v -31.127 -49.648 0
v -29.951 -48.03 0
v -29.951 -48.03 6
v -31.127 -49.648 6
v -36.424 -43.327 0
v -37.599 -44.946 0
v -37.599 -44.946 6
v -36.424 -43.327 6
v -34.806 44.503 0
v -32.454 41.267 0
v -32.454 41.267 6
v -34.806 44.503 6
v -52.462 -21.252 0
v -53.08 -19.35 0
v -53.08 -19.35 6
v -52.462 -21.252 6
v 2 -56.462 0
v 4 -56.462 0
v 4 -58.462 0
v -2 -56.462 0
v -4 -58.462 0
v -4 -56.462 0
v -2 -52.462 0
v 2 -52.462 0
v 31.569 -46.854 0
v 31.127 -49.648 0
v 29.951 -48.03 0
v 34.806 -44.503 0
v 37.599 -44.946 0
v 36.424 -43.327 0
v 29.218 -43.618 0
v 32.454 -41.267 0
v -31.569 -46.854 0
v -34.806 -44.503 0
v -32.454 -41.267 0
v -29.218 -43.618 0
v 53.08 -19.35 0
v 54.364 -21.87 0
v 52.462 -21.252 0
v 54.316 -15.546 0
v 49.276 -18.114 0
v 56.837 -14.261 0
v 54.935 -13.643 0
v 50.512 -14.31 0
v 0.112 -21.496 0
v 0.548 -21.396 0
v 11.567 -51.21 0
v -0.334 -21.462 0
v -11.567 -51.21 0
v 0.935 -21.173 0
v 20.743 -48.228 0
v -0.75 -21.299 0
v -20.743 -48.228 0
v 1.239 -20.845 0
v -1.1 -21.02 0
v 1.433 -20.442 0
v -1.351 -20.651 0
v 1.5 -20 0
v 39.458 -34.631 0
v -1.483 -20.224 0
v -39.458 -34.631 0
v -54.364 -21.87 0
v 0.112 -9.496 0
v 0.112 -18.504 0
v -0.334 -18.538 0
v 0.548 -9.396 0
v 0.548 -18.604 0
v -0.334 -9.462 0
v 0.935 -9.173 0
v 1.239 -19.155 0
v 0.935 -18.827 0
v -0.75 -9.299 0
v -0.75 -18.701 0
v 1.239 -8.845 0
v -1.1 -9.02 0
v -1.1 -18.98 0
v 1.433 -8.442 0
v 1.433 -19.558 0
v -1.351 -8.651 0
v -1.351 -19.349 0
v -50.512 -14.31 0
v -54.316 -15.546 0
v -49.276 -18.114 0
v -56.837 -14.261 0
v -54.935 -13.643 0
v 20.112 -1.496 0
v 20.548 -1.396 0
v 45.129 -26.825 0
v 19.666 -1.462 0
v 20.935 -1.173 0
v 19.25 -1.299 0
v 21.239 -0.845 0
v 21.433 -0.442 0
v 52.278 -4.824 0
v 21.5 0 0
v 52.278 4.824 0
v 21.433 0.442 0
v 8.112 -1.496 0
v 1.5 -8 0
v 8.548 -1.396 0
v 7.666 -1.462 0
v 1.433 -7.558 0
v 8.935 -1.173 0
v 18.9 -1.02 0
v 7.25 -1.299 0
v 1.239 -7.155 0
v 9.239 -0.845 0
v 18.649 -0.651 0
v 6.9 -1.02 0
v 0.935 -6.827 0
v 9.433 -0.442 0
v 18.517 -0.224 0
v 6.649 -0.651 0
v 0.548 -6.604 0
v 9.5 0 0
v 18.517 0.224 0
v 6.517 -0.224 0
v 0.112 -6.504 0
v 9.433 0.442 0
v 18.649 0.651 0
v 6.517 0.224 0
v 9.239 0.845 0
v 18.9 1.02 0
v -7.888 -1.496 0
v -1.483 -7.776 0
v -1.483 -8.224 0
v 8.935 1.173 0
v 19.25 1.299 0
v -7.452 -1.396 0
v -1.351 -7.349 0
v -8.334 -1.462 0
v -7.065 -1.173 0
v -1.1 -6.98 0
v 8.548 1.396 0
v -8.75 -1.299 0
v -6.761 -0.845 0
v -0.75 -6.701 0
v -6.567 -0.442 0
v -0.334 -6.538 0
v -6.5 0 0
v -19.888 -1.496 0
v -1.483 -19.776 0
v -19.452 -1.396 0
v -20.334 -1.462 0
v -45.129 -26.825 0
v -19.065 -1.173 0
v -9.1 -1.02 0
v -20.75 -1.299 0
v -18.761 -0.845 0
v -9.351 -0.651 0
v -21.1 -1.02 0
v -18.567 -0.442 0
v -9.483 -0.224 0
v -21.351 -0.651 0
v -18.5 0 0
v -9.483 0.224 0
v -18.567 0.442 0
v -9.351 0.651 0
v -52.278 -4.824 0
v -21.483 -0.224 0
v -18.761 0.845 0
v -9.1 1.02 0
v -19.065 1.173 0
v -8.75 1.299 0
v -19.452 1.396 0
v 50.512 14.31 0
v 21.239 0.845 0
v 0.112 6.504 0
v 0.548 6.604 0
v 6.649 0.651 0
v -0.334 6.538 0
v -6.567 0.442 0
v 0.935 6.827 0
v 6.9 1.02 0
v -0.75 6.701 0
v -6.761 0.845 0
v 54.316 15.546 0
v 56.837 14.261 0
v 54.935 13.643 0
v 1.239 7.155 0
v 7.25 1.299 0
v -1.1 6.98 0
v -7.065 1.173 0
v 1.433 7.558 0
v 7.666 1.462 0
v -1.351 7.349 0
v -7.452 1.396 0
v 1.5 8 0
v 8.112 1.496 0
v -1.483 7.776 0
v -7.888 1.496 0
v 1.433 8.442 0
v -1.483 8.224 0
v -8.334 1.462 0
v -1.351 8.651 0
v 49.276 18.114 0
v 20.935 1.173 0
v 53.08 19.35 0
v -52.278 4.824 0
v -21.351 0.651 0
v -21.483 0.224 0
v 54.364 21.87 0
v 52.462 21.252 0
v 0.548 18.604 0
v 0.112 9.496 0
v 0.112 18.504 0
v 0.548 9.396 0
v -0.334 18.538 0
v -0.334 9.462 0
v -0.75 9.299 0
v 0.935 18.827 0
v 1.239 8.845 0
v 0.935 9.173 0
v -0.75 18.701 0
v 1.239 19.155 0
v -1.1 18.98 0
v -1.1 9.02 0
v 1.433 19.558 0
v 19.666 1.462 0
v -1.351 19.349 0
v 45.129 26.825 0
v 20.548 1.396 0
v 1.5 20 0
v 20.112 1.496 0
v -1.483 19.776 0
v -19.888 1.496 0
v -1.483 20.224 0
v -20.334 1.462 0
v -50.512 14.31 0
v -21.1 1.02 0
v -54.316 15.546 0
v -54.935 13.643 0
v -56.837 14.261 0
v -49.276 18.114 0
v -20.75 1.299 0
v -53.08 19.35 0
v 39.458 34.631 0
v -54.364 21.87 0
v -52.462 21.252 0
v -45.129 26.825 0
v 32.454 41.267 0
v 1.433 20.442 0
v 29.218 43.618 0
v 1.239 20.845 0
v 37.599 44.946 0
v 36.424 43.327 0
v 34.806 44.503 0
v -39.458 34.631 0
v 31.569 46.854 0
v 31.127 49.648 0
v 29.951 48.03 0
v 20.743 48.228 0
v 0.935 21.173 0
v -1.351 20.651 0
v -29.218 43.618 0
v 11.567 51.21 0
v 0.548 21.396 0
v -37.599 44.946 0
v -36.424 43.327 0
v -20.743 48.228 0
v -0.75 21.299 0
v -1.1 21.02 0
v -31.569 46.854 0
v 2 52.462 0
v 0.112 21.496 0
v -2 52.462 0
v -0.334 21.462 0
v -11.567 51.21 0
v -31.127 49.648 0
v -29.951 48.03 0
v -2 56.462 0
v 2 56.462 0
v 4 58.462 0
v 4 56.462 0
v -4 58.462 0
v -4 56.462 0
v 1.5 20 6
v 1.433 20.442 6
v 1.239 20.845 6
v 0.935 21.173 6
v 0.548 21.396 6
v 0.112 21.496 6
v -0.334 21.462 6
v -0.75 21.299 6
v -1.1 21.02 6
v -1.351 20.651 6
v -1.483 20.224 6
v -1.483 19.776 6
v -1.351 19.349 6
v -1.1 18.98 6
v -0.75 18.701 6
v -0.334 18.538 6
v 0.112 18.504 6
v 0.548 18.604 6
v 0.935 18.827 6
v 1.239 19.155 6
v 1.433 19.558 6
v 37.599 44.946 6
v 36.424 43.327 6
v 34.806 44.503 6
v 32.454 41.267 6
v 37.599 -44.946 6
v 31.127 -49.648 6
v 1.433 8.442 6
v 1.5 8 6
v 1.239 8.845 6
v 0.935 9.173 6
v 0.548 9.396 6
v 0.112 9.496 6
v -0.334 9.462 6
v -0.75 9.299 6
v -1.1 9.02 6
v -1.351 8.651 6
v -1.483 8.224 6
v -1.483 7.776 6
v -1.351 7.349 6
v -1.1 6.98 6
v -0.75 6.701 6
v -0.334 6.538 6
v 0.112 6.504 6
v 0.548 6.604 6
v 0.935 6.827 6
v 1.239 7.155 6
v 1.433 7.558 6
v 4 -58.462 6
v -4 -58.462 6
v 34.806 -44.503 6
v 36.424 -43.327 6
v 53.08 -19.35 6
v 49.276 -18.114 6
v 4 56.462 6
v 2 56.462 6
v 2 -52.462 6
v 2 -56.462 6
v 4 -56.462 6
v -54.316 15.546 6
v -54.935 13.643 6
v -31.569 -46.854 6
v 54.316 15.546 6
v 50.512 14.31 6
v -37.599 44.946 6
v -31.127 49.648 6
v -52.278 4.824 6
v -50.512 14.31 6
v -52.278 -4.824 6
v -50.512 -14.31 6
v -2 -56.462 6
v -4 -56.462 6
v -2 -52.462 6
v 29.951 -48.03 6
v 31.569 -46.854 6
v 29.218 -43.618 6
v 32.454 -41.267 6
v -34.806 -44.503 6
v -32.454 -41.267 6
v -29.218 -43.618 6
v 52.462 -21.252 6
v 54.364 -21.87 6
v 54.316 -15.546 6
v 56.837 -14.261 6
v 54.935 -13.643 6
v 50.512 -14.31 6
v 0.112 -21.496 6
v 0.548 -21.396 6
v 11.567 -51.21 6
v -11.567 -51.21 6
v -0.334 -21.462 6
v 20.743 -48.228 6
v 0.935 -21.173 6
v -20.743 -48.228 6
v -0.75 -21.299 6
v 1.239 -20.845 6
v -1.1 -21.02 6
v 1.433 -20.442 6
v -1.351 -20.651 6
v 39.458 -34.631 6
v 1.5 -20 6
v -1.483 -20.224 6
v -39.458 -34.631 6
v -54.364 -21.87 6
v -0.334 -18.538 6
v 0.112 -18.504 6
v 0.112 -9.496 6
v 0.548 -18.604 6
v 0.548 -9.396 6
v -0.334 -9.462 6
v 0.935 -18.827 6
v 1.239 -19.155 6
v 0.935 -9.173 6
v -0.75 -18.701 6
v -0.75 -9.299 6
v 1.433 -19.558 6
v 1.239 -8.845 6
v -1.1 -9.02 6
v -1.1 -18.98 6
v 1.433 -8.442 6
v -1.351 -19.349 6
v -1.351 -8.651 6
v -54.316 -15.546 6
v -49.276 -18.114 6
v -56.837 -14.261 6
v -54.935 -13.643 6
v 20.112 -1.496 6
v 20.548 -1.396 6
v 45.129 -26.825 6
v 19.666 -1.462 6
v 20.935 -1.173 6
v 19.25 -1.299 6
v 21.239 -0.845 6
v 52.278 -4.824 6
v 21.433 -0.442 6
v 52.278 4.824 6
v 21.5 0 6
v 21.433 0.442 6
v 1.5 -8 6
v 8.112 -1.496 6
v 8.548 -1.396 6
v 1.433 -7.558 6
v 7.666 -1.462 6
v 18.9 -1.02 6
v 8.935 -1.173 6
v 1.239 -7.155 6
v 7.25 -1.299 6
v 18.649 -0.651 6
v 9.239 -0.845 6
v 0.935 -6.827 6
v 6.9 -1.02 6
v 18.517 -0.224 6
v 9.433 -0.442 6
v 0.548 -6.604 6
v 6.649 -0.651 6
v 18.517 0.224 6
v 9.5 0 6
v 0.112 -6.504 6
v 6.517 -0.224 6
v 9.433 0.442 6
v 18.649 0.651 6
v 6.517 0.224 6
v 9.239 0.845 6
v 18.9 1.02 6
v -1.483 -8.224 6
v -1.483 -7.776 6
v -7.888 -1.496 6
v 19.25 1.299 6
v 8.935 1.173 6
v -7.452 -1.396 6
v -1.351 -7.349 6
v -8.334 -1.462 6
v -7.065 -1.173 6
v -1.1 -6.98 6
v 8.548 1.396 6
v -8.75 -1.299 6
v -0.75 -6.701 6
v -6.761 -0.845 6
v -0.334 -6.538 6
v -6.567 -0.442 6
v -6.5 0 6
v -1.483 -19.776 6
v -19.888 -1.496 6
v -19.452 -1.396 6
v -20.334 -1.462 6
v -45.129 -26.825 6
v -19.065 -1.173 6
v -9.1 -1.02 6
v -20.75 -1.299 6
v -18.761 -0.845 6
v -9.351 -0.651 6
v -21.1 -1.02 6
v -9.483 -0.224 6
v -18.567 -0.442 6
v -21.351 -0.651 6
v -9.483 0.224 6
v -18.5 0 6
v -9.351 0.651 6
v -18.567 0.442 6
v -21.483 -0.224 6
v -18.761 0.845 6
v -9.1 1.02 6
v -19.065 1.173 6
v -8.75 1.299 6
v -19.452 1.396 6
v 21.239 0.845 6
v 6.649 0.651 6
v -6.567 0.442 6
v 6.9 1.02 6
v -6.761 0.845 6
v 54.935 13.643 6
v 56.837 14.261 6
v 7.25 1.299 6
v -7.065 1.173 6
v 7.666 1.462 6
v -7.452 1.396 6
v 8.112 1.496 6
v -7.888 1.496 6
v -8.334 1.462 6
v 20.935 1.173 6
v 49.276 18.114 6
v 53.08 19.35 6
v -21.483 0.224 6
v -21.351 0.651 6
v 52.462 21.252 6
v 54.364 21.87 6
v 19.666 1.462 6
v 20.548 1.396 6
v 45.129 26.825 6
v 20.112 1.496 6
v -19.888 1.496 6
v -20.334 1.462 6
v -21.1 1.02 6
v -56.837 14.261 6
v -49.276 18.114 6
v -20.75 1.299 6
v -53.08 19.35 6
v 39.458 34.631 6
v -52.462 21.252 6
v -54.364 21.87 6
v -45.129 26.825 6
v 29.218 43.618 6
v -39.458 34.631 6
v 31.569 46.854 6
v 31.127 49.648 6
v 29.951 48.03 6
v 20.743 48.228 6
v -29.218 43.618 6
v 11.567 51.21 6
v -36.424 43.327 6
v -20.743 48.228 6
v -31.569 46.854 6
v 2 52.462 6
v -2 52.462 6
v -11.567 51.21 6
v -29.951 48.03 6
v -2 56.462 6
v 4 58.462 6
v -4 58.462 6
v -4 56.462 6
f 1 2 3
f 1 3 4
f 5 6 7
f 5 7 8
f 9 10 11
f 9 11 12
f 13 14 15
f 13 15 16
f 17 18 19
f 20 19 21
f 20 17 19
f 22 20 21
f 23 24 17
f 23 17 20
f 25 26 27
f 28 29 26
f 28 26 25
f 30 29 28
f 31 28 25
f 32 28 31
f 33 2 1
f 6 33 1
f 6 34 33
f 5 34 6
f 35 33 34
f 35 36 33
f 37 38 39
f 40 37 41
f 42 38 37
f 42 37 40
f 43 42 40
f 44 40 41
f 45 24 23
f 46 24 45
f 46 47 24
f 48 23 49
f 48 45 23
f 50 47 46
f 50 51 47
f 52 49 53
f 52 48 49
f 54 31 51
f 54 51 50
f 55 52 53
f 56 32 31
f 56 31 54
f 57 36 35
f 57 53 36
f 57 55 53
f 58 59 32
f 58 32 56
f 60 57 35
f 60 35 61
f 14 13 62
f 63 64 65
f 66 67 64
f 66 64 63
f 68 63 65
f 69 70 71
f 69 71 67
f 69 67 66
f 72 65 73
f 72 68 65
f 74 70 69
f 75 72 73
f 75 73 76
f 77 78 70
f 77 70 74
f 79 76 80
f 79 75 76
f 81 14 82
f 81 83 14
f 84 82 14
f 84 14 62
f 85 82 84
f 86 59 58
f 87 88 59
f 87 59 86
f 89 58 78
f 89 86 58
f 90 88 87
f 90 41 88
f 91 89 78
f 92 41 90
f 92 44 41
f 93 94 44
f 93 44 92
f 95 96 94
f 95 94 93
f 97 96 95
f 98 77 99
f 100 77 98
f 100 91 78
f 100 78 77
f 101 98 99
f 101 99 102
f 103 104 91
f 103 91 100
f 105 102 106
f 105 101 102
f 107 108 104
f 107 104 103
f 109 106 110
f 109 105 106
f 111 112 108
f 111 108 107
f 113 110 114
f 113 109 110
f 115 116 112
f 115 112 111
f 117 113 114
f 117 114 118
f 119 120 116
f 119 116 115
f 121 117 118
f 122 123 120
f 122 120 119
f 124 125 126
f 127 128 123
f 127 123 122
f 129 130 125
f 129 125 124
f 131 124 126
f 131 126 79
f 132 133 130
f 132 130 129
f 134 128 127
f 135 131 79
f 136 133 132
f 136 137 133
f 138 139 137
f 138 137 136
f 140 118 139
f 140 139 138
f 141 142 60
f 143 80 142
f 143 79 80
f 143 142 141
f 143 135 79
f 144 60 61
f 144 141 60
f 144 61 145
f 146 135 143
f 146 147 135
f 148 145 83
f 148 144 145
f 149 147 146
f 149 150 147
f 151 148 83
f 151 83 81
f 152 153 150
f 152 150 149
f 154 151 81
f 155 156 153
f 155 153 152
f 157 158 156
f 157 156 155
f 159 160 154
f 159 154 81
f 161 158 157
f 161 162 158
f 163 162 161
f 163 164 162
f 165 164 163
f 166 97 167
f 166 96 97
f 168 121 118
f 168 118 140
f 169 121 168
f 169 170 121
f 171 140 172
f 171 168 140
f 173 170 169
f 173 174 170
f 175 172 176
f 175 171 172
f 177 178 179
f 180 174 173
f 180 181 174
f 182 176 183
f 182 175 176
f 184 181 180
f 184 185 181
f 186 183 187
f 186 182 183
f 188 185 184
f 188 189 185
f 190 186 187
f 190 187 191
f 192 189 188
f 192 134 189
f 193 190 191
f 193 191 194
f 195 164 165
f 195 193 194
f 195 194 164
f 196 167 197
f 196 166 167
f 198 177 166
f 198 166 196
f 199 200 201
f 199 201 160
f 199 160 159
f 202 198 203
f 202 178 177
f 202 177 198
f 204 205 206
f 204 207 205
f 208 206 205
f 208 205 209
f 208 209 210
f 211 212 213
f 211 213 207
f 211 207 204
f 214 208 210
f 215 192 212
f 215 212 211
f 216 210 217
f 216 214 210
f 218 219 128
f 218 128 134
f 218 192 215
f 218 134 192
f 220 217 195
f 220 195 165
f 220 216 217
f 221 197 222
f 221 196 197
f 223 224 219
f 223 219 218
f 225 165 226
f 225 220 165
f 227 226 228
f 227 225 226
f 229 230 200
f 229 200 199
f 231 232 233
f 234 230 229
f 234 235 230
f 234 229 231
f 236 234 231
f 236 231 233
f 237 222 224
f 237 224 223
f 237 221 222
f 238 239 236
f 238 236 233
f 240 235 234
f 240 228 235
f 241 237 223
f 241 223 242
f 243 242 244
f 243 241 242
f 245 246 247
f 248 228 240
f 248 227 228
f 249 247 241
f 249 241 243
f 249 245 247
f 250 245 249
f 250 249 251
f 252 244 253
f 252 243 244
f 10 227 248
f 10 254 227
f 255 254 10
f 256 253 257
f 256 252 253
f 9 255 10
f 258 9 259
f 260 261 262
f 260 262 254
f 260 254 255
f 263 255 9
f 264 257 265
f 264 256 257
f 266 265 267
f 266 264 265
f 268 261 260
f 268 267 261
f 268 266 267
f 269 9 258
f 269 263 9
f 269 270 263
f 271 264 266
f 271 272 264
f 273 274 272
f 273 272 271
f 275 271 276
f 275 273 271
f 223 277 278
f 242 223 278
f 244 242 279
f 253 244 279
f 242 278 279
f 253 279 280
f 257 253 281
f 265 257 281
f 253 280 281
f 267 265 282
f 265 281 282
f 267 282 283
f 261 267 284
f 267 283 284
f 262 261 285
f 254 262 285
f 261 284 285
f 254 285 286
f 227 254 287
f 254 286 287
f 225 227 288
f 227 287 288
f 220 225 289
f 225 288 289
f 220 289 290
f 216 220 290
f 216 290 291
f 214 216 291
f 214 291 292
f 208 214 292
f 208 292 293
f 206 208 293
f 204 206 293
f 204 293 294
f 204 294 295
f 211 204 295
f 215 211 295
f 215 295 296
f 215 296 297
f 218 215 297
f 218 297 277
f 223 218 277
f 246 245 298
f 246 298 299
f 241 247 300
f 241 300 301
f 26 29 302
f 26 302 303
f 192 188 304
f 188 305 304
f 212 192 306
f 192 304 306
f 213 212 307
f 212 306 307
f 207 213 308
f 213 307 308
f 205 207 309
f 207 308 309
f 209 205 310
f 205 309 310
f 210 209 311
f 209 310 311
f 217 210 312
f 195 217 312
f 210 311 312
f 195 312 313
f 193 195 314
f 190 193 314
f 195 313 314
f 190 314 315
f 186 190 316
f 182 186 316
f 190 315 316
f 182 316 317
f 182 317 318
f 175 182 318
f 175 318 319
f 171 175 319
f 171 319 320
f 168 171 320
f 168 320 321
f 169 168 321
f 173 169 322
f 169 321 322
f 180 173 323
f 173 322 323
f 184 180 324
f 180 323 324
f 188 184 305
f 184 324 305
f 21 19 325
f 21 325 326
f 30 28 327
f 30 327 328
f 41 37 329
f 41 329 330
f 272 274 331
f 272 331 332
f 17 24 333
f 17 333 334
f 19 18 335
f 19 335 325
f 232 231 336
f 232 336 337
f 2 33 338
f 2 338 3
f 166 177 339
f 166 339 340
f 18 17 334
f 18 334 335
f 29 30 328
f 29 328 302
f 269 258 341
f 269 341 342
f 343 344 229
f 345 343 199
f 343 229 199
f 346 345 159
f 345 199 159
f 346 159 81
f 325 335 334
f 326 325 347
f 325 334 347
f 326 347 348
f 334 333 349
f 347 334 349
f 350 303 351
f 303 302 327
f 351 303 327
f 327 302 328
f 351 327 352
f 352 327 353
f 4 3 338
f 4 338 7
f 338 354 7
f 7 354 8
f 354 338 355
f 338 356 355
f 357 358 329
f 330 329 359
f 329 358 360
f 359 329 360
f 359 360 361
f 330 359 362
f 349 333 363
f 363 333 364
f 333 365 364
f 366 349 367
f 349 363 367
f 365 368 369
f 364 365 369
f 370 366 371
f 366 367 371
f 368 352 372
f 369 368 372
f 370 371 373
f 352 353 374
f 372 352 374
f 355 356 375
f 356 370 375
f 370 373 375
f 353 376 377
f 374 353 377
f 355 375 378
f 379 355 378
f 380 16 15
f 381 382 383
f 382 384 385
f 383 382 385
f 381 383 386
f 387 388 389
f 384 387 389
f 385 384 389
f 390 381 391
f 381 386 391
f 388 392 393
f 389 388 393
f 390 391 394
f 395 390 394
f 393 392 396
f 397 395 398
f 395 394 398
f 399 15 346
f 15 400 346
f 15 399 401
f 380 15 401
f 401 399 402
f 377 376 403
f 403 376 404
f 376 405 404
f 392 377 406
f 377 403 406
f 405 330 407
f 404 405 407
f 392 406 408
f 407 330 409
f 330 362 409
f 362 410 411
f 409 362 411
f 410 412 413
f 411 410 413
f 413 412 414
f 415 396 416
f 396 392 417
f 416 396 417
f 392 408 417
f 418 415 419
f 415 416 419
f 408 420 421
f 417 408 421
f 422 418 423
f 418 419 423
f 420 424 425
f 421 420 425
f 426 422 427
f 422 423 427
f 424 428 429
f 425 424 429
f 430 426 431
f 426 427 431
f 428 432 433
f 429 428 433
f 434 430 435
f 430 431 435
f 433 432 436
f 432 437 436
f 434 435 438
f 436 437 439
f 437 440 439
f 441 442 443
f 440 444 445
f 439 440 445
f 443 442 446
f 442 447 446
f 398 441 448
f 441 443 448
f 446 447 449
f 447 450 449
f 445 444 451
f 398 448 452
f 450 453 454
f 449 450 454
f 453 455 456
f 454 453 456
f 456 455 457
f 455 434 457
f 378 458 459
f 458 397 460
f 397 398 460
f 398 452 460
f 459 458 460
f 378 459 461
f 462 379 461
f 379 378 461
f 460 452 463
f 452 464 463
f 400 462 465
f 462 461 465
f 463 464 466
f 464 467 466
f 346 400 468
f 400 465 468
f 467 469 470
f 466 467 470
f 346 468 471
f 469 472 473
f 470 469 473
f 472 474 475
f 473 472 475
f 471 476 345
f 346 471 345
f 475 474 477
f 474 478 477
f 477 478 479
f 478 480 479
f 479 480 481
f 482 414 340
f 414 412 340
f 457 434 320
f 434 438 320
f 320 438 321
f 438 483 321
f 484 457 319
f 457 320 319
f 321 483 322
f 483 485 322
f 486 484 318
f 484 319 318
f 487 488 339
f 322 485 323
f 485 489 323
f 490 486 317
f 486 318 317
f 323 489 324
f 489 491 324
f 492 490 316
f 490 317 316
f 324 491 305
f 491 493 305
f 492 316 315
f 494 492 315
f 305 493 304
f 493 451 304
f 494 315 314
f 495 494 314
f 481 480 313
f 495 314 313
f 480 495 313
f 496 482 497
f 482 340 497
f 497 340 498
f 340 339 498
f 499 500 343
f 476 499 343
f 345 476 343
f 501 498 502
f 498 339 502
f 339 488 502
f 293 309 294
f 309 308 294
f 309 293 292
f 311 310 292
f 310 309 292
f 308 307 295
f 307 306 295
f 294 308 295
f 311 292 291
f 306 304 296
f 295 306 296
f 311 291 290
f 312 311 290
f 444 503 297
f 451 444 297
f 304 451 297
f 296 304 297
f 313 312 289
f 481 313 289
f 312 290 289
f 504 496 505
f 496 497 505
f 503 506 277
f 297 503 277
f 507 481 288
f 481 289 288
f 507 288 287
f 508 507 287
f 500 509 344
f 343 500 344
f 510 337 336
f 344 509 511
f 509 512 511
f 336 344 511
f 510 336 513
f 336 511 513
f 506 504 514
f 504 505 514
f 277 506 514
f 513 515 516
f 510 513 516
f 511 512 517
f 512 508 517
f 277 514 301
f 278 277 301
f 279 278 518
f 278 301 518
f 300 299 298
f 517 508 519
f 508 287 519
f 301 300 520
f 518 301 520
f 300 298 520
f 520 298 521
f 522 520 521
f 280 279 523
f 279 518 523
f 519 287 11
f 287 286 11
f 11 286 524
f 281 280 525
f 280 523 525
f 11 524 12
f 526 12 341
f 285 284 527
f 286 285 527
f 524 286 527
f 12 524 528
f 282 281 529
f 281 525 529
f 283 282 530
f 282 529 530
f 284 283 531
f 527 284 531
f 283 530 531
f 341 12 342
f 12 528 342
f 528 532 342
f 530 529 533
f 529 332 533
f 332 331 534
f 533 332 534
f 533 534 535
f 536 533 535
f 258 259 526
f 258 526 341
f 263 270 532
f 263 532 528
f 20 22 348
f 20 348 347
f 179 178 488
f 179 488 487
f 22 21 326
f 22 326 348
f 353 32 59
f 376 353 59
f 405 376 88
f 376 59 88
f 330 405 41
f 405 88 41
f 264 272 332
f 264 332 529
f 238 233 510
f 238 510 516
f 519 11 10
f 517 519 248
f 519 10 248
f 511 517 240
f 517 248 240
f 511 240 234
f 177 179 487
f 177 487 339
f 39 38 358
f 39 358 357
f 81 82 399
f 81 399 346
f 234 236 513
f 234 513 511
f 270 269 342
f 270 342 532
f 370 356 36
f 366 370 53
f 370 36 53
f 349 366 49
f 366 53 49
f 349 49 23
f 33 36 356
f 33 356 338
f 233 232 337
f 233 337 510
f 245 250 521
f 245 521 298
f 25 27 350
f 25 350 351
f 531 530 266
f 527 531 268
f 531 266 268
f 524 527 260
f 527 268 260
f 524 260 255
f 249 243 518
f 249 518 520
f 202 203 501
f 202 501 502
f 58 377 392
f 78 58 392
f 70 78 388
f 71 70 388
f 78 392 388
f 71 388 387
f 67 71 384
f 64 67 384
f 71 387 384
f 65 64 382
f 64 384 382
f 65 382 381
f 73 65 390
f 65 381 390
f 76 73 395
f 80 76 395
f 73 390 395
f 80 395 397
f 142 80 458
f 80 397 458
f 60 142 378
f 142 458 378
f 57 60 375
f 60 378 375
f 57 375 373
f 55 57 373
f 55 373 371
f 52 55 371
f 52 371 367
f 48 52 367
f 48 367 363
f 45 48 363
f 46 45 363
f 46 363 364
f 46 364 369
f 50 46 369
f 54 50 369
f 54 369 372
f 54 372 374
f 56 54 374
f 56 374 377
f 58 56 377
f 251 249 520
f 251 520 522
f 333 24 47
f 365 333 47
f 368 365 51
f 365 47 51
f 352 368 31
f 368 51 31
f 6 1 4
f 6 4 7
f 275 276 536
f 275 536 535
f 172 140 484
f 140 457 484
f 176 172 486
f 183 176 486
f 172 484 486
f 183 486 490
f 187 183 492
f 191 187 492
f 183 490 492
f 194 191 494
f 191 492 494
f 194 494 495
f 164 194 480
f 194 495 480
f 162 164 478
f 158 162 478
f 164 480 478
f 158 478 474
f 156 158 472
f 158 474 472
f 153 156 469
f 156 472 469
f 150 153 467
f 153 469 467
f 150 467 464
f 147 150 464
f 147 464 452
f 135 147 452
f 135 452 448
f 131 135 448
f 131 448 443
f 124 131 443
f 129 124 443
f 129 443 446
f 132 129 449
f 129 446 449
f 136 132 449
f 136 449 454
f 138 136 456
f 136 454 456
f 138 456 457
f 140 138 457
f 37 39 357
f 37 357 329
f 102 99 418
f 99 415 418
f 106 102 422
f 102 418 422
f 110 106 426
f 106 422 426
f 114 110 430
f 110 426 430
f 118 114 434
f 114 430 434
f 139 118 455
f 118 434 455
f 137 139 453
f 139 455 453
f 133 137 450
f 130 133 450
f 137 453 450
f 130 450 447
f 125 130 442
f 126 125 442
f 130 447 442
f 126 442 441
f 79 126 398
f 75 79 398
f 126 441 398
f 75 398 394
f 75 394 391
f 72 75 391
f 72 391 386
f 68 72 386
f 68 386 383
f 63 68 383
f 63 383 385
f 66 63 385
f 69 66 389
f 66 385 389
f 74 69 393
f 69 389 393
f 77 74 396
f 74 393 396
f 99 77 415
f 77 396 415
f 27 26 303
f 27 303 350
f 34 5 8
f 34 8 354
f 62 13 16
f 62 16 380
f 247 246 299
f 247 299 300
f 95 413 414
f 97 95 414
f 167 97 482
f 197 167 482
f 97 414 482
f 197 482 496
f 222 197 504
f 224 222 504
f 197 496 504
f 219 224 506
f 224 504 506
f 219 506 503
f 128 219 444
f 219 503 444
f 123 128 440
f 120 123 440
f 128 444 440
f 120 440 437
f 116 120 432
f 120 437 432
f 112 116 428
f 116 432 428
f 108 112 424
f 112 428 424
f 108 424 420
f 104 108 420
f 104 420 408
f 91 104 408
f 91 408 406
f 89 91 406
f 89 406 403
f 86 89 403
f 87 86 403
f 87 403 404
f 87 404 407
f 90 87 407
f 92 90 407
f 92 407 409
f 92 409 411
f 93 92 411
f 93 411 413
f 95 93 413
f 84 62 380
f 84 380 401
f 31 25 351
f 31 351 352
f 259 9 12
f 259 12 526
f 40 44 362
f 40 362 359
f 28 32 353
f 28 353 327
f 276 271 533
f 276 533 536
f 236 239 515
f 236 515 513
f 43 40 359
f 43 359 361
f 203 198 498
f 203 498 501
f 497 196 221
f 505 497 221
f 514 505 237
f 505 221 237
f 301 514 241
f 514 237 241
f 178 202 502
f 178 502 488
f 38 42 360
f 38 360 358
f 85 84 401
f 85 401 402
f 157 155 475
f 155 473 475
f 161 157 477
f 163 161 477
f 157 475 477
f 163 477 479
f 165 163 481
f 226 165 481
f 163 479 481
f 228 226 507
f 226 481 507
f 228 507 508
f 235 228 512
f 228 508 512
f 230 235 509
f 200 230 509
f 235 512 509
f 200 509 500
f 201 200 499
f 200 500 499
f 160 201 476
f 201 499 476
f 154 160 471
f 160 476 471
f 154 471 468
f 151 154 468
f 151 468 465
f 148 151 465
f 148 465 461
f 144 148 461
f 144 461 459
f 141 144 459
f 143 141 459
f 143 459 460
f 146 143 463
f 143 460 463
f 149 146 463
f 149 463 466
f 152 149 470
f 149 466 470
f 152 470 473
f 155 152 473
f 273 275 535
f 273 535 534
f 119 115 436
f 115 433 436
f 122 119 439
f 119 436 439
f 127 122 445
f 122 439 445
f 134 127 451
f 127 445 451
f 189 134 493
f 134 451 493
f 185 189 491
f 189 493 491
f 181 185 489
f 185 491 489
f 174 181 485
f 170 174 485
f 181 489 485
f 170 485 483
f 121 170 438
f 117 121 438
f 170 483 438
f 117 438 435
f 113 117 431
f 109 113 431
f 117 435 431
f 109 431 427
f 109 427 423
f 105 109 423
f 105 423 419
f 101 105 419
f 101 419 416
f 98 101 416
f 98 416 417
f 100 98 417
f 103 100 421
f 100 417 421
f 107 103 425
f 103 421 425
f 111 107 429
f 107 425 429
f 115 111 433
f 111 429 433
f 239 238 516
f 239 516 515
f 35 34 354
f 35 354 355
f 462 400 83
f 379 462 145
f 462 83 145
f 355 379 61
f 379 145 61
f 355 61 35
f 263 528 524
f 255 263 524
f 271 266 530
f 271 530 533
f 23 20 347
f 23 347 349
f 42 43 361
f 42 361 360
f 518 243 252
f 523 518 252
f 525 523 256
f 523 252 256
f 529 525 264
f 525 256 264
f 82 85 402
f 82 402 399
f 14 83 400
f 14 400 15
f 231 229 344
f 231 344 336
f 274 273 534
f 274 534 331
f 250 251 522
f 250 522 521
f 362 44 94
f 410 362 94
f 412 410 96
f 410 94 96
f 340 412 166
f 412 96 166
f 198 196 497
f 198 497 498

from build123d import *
from build123d.topology import SkipClean

# Parameters (mm, degrees)
SKETCH1_R           = 52.5
BOSS_EXTRUDE1_DEPTH = 2
BOSS_EXTRUDE2_DEPTH = 6
CIRPATTERN1_COUNT   = 10
SKETCH4_R           = 1.5
CUT_EXTRUDE2_DEPTH  = 10
SKETCH7_R           = 1.5
CUT_EXTRUDE3_DEPTH  = 10


with BuildPart() as part:
    # Sketch1 → Boss-Extrude1 (new body)
    with BuildSketch(Plane.XY):
        Circle(SKETCH1_R)
    extrude(amount=BOSS_EXTRUDE1_DEPTH)

    # Sketch6 → Boss-Extrude2 (add)
    with SkipClean():  # the faces are left unmerged after this step: merging them gives an invalid solid
        with BuildSketch(Plane.XY):
            with BuildLine():
                Line((-2, 52.46189093), (-2, 56.46189093))
                Line((-2, 56.46189093), (-4, 56.46189093))
                Line((-4, 56.46189093), (-4, 58.46189093))
                Line((-4, 58.46189093), (4, 58.46189093))
                Line((4, 58.46189093), (4, 56.46189093))
                Line((4, 56.46189093), (2, 56.46189093))
                Line((2, 56.46189093), (2, 52.46189093))
                ThreePointArc((2, 52.46189093), (0, -52.5), (-2, 52.46189093))
            make_face()
        boss_extrude2 = extrude(amount=BOSS_EXTRUDE2_DEPTH)

    # CirPattern1: Boss-Extrude2 ×10 about axis
    cirpattern1_axis = Axis((0, 0, 0), (0, 0, 1))
    for i in range(1, CIRPATTERN1_COUNT):
        add(boss_extrude2.rotate(cirpattern1_axis, i * 360 / CIRPATTERN1_COUNT))

    # Sketch4 → Cut-Extrude2 (cut, symmetric)
    with BuildSketch(Plane.XY.offset(2)):
        with Locations((0, 8)):
            Circle(SKETCH4_R)
        with Locations((8, 0)):
            Circle(SKETCH4_R)
        with Locations((0, -8)):
            Circle(SKETCH4_R)
        with Locations((-8, 0)):
            Circle(SKETCH4_R)
    extrude(amount=CUT_EXTRUDE2_DEPTH, both=True, mode=Mode.SUBTRACT)

    # Sketch7 → Cut-Extrude3 (cut, symmetric)
    with BuildSketch(Plane.XY.offset(6)):
        with Locations((0, 20)):
            Circle(SKETCH7_R)
        with Locations((20, 0)):
            Circle(SKETCH7_R)
        with Locations((0, -20)):
            Circle(SKETCH7_R)
        with Locations((-20, 0)):
            Circle(SKETCH7_R)
    extrude(amount=CUT_EXTRUDE3_DEPTH, both=True, mode=Mode.SUBTRACT)


solid = part.part
